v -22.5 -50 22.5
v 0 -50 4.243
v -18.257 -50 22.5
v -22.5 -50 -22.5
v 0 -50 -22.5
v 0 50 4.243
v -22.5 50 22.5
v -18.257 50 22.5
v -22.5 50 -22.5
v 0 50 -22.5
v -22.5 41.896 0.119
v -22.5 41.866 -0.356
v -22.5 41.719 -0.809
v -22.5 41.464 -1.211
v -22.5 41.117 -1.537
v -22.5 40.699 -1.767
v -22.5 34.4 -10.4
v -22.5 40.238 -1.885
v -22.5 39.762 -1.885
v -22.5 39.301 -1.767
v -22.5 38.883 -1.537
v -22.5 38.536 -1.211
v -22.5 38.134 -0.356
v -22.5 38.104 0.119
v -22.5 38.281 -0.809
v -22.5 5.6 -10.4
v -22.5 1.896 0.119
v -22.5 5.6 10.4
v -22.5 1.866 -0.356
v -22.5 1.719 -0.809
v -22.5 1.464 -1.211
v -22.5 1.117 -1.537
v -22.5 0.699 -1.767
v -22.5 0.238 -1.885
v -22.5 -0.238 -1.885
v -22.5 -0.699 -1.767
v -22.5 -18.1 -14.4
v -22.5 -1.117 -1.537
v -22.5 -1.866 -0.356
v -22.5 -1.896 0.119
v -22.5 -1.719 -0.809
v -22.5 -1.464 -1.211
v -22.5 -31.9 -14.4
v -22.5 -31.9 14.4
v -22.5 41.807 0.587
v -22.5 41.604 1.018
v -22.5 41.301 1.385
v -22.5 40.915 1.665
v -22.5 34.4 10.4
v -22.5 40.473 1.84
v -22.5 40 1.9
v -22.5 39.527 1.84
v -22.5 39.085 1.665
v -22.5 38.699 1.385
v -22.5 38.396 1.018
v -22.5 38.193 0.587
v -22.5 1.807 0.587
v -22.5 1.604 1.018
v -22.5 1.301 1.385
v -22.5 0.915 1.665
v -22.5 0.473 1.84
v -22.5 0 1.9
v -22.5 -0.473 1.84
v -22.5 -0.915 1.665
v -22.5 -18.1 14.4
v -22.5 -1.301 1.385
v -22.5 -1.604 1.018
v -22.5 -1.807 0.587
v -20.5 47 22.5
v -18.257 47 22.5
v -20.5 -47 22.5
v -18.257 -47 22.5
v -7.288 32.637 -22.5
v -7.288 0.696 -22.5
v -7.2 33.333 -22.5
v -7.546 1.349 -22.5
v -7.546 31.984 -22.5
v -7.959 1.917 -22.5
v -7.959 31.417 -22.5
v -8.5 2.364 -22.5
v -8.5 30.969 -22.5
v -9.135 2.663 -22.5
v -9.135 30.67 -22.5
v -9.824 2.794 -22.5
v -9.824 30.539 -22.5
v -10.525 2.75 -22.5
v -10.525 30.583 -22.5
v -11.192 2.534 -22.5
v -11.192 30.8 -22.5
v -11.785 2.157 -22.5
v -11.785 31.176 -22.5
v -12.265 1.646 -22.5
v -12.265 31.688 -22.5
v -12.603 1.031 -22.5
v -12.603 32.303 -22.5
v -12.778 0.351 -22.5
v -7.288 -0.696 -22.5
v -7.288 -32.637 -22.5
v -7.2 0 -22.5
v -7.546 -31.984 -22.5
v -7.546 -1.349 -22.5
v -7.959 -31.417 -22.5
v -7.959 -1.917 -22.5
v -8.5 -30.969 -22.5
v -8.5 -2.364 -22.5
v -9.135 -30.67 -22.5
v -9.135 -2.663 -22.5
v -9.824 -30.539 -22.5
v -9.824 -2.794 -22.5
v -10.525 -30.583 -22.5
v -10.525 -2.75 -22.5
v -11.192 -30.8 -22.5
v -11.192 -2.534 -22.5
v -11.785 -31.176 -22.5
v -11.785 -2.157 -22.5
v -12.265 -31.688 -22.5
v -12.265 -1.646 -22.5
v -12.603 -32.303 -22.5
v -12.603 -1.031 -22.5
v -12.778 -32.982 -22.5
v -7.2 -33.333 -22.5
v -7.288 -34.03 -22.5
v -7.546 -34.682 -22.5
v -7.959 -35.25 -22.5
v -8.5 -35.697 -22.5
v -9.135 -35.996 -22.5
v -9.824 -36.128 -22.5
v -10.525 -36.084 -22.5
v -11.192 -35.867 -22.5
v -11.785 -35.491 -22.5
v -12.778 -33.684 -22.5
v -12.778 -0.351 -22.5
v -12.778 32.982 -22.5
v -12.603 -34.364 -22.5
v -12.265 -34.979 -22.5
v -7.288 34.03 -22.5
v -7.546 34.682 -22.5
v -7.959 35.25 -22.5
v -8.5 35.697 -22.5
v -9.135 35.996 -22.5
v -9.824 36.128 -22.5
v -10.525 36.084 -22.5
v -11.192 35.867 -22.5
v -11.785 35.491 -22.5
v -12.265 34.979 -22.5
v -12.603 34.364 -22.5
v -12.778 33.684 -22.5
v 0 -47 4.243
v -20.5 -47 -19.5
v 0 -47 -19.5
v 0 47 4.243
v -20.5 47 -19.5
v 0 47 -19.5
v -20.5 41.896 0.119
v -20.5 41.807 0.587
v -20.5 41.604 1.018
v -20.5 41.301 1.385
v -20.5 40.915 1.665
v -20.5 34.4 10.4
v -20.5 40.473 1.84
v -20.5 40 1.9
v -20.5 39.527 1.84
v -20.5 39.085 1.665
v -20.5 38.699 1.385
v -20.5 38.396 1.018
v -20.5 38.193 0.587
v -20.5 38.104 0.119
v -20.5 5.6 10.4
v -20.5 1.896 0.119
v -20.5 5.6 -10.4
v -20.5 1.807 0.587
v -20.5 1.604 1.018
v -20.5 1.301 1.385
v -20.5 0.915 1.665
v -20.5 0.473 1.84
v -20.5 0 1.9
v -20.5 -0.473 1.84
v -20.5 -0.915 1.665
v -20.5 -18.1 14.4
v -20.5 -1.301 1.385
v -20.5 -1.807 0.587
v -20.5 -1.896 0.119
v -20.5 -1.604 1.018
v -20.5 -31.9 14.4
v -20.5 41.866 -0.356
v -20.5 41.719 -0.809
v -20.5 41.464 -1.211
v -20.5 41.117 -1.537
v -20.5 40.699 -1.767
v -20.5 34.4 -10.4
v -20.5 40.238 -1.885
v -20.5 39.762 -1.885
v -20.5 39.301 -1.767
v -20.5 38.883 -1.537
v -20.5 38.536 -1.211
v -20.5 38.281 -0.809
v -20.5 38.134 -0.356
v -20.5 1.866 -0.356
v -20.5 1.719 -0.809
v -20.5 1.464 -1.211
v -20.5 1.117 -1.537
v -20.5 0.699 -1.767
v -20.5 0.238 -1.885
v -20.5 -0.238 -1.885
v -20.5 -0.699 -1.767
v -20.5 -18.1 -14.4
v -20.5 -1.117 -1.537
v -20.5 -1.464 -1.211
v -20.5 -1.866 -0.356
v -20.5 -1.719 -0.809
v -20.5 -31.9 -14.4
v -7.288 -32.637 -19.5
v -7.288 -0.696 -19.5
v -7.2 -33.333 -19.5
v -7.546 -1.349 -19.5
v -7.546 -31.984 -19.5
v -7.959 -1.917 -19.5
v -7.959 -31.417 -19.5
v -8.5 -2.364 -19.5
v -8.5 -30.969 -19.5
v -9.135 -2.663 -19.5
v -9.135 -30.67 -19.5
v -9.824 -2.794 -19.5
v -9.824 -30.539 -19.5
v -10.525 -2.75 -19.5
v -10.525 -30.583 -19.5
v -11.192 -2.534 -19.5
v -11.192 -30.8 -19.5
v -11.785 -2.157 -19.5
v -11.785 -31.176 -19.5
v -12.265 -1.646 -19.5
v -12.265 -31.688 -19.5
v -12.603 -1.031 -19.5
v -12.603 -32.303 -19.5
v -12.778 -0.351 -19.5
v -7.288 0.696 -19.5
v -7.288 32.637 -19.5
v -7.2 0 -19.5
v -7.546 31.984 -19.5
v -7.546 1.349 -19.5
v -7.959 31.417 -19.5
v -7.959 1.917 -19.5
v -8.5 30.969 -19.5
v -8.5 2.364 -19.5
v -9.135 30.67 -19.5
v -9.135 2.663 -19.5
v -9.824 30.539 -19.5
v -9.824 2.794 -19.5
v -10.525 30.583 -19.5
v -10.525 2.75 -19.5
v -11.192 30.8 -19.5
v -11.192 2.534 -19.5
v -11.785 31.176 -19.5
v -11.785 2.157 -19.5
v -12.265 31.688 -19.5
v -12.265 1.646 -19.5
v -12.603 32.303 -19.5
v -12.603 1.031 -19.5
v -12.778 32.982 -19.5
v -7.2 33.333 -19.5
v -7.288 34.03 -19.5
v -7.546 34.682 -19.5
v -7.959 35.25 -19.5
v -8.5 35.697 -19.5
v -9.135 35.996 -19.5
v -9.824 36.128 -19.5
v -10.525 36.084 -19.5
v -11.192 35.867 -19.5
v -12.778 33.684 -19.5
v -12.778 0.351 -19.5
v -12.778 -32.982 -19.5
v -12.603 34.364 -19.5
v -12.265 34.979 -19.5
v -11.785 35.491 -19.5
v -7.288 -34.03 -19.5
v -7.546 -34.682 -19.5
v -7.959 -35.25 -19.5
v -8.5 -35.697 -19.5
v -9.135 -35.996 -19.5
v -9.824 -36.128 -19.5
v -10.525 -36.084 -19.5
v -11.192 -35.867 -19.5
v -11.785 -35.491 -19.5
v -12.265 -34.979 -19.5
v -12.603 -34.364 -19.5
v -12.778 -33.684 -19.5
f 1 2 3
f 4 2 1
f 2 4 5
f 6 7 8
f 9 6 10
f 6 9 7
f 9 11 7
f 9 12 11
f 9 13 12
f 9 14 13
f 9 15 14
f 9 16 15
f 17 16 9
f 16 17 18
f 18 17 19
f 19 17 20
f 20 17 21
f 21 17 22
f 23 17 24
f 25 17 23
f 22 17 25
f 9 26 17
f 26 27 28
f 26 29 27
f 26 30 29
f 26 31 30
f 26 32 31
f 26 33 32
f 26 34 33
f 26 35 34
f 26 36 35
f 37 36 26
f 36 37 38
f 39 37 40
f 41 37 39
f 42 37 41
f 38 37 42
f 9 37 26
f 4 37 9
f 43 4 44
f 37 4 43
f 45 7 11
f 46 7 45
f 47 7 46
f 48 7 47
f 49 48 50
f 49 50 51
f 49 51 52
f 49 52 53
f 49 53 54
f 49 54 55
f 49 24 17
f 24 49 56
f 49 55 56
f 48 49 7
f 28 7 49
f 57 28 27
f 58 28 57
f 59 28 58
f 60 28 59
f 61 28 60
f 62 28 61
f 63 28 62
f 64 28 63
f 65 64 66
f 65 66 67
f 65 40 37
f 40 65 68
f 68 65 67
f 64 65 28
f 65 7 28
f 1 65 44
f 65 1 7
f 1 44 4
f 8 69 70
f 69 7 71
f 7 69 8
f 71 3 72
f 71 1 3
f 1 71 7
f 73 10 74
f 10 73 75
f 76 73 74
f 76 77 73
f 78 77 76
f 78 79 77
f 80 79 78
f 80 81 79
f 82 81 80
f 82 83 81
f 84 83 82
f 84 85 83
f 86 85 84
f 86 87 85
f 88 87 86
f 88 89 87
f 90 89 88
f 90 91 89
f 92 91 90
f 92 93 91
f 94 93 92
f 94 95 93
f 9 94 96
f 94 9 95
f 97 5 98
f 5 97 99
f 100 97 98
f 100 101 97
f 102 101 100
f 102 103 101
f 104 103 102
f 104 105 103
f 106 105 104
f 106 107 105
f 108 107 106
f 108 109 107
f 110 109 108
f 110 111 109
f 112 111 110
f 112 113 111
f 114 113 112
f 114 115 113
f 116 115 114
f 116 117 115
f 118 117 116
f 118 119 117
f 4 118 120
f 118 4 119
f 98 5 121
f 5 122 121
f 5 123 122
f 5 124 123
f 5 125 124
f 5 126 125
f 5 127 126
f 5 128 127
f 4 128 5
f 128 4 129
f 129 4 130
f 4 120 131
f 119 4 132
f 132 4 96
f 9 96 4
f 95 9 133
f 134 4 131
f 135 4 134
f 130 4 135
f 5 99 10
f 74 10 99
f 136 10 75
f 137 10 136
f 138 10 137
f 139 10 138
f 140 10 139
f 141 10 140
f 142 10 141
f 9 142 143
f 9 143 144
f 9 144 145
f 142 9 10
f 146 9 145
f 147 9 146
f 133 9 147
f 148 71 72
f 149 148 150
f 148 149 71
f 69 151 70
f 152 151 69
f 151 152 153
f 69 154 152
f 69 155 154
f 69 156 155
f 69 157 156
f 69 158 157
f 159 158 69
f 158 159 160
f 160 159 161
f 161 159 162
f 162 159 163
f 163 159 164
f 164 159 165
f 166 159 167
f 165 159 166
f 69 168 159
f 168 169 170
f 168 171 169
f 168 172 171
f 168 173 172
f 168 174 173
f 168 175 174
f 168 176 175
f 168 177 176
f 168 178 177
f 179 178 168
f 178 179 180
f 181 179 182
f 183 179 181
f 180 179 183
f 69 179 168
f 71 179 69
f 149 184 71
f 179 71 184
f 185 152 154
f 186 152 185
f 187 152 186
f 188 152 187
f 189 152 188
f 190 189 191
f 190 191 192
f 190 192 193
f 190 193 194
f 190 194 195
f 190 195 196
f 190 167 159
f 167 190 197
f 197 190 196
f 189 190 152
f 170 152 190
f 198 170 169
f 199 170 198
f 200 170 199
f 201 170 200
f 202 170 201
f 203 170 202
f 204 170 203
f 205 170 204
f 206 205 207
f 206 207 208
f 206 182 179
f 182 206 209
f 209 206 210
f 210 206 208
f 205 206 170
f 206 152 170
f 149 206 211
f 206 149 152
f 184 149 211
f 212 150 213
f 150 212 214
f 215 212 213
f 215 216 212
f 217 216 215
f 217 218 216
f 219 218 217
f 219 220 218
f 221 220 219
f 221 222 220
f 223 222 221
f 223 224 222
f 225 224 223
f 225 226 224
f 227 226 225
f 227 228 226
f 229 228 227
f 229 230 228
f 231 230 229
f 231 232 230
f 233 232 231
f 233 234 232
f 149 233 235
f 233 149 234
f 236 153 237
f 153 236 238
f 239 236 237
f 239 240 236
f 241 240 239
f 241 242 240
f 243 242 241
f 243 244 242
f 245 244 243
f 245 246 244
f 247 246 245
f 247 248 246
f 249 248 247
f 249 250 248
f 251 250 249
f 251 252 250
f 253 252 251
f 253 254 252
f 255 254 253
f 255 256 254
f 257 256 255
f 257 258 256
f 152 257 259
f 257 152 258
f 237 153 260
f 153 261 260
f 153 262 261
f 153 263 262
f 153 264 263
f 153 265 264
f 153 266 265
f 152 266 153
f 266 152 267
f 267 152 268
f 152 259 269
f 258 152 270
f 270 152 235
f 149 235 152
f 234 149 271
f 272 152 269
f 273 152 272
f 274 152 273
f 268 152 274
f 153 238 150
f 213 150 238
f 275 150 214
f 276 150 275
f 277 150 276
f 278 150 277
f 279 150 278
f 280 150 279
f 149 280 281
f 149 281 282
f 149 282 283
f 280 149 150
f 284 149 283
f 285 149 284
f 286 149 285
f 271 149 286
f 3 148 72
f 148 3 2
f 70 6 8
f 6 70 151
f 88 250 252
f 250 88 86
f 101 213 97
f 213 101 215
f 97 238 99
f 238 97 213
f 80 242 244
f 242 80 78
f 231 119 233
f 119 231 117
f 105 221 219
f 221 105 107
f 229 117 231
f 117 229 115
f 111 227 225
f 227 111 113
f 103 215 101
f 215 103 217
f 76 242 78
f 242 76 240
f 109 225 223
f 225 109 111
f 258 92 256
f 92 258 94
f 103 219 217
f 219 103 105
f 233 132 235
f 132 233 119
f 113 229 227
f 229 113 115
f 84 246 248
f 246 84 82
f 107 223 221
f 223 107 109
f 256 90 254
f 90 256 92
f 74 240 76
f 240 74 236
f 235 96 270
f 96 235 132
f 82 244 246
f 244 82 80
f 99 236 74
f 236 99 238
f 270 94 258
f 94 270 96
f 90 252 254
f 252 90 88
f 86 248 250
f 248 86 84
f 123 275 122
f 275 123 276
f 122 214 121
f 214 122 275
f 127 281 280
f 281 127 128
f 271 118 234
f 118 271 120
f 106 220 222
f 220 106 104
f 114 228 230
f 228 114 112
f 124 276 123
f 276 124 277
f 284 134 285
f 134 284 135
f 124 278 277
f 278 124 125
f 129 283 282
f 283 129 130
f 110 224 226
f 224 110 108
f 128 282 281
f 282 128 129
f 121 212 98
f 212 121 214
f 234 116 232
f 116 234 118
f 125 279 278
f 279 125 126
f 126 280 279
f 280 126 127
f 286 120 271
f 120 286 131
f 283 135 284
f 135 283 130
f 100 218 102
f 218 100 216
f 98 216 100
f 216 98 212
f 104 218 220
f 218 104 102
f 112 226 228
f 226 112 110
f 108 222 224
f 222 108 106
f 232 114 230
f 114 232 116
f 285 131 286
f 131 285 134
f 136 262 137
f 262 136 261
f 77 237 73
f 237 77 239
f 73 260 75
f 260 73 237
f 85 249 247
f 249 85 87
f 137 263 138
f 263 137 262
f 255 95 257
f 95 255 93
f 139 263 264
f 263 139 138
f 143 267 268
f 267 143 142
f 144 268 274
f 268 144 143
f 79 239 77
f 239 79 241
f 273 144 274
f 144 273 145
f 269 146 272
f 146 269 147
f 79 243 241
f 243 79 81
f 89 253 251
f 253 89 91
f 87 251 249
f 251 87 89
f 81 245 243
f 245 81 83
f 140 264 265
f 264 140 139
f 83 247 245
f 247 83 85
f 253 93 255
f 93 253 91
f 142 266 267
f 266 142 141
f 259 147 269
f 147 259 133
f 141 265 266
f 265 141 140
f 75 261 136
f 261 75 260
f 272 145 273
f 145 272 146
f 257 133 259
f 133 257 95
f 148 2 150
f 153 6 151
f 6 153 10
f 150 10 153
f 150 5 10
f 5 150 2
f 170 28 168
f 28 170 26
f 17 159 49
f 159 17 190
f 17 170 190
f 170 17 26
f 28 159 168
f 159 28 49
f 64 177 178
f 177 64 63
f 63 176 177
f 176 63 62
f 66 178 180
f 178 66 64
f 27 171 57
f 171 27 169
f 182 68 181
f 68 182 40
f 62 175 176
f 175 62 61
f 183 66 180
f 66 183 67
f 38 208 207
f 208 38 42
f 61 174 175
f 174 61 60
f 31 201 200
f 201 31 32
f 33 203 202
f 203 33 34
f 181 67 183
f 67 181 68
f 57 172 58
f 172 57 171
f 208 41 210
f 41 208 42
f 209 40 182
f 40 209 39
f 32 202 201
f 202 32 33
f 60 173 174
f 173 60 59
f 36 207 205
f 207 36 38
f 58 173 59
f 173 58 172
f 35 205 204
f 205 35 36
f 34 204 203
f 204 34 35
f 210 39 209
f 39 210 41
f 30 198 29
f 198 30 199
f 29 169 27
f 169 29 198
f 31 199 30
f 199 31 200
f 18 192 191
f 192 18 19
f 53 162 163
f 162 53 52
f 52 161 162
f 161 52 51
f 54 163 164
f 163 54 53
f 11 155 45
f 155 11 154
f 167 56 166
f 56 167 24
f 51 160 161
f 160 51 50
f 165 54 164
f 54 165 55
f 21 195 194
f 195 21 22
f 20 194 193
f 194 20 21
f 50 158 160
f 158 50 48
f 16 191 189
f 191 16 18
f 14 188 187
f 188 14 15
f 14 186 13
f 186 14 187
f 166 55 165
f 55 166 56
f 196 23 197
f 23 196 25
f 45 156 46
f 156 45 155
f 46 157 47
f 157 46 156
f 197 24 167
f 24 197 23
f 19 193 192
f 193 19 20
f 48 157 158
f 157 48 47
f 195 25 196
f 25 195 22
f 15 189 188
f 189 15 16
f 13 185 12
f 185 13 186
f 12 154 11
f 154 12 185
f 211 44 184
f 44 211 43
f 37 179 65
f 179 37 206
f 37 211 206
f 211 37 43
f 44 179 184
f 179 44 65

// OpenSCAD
// 90 degree bracket

$fn = 25;
length = 45;  // default 45
width = 100;
walls = 3;

rHole = 2.8;

// Connecteur AC
// 28x20
AC_width = 28 +0.8;
AC_height = 20+0.8;
AC_hole_dist = 40;
AC_hole_diam = 3+0.8;

// switch
sw_width = 13+0.8;
sw_width2 = 1.4+0.8;
sw_height = 28+0.8;
sw_height2 = 28+0.8;



rotate([90, 0, 0])
difference()
{
    cube([length, length, width], center=true);
    
    translate([2, 3, 0])
    cube([length, length, width-(walls * 2)], center=true);
    
    rotate([0,0,45])
    translate([length/2 + 3, 0, 0])
    cube([length, length + 20, width+2], center= true);
    
    // bottom screw holes
    translate([-10, -length/2 + 5, 0])
    rotate([90, 0, 0])
    #cylinder(r=rHole, h=10);

    translate([-10, -length/2 + 5, width/3])
    rotate([90, 0, 0])
    #cylinder(r=rHole, h=10);
    
    translate([-10, -length/2 + 5, -width/3])
    rotate([90, 0, 0])
    #cylinder(r=rHole, h=10);
    
    translate([15,0,0])
    #cube([30,50,100],true);
    
    // AC socket
    
    translate([-length/2+walls,0,-20]) rotate([90,90,0])
    #cube([AC_width,3*walls,AC_height],true);
    
    translate([-length/2-walls,0,AC_hole_dist/2-20]) rotate([90,0,90]) 
    #cylinder(3*walls,d=AC_hole_diam,true);
    translate([-length/2-walls,0,-AC_hole_dist/2-20]) rotate([90,0,90]) 
    #cylinder(3*walls,d=AC_hole_diam,true);    
    
    
    // Switch
    translate([-length/2+walls,0,25]) rotate([90,90,0])
    #cube([sw_width,3*walls,sw_height],true);
    
    translate([-length/2+walls,0,25]) rotate([90,90,0])
    #cube([sw_width2,3*walls,sw_height2],true);
    
    
    // side screw holes
    //translate([-length/2 - 5, length/2 - 8, 0])
    //rotate([0, 90, 0])
    //#cylinder(r=rHole, h=10);

    //translate([-length/2 - 5, -length/2 + 16, 0])
    //rotate([0, 90, 0])
    //#cylinder(r=rHole, h=10);
}
